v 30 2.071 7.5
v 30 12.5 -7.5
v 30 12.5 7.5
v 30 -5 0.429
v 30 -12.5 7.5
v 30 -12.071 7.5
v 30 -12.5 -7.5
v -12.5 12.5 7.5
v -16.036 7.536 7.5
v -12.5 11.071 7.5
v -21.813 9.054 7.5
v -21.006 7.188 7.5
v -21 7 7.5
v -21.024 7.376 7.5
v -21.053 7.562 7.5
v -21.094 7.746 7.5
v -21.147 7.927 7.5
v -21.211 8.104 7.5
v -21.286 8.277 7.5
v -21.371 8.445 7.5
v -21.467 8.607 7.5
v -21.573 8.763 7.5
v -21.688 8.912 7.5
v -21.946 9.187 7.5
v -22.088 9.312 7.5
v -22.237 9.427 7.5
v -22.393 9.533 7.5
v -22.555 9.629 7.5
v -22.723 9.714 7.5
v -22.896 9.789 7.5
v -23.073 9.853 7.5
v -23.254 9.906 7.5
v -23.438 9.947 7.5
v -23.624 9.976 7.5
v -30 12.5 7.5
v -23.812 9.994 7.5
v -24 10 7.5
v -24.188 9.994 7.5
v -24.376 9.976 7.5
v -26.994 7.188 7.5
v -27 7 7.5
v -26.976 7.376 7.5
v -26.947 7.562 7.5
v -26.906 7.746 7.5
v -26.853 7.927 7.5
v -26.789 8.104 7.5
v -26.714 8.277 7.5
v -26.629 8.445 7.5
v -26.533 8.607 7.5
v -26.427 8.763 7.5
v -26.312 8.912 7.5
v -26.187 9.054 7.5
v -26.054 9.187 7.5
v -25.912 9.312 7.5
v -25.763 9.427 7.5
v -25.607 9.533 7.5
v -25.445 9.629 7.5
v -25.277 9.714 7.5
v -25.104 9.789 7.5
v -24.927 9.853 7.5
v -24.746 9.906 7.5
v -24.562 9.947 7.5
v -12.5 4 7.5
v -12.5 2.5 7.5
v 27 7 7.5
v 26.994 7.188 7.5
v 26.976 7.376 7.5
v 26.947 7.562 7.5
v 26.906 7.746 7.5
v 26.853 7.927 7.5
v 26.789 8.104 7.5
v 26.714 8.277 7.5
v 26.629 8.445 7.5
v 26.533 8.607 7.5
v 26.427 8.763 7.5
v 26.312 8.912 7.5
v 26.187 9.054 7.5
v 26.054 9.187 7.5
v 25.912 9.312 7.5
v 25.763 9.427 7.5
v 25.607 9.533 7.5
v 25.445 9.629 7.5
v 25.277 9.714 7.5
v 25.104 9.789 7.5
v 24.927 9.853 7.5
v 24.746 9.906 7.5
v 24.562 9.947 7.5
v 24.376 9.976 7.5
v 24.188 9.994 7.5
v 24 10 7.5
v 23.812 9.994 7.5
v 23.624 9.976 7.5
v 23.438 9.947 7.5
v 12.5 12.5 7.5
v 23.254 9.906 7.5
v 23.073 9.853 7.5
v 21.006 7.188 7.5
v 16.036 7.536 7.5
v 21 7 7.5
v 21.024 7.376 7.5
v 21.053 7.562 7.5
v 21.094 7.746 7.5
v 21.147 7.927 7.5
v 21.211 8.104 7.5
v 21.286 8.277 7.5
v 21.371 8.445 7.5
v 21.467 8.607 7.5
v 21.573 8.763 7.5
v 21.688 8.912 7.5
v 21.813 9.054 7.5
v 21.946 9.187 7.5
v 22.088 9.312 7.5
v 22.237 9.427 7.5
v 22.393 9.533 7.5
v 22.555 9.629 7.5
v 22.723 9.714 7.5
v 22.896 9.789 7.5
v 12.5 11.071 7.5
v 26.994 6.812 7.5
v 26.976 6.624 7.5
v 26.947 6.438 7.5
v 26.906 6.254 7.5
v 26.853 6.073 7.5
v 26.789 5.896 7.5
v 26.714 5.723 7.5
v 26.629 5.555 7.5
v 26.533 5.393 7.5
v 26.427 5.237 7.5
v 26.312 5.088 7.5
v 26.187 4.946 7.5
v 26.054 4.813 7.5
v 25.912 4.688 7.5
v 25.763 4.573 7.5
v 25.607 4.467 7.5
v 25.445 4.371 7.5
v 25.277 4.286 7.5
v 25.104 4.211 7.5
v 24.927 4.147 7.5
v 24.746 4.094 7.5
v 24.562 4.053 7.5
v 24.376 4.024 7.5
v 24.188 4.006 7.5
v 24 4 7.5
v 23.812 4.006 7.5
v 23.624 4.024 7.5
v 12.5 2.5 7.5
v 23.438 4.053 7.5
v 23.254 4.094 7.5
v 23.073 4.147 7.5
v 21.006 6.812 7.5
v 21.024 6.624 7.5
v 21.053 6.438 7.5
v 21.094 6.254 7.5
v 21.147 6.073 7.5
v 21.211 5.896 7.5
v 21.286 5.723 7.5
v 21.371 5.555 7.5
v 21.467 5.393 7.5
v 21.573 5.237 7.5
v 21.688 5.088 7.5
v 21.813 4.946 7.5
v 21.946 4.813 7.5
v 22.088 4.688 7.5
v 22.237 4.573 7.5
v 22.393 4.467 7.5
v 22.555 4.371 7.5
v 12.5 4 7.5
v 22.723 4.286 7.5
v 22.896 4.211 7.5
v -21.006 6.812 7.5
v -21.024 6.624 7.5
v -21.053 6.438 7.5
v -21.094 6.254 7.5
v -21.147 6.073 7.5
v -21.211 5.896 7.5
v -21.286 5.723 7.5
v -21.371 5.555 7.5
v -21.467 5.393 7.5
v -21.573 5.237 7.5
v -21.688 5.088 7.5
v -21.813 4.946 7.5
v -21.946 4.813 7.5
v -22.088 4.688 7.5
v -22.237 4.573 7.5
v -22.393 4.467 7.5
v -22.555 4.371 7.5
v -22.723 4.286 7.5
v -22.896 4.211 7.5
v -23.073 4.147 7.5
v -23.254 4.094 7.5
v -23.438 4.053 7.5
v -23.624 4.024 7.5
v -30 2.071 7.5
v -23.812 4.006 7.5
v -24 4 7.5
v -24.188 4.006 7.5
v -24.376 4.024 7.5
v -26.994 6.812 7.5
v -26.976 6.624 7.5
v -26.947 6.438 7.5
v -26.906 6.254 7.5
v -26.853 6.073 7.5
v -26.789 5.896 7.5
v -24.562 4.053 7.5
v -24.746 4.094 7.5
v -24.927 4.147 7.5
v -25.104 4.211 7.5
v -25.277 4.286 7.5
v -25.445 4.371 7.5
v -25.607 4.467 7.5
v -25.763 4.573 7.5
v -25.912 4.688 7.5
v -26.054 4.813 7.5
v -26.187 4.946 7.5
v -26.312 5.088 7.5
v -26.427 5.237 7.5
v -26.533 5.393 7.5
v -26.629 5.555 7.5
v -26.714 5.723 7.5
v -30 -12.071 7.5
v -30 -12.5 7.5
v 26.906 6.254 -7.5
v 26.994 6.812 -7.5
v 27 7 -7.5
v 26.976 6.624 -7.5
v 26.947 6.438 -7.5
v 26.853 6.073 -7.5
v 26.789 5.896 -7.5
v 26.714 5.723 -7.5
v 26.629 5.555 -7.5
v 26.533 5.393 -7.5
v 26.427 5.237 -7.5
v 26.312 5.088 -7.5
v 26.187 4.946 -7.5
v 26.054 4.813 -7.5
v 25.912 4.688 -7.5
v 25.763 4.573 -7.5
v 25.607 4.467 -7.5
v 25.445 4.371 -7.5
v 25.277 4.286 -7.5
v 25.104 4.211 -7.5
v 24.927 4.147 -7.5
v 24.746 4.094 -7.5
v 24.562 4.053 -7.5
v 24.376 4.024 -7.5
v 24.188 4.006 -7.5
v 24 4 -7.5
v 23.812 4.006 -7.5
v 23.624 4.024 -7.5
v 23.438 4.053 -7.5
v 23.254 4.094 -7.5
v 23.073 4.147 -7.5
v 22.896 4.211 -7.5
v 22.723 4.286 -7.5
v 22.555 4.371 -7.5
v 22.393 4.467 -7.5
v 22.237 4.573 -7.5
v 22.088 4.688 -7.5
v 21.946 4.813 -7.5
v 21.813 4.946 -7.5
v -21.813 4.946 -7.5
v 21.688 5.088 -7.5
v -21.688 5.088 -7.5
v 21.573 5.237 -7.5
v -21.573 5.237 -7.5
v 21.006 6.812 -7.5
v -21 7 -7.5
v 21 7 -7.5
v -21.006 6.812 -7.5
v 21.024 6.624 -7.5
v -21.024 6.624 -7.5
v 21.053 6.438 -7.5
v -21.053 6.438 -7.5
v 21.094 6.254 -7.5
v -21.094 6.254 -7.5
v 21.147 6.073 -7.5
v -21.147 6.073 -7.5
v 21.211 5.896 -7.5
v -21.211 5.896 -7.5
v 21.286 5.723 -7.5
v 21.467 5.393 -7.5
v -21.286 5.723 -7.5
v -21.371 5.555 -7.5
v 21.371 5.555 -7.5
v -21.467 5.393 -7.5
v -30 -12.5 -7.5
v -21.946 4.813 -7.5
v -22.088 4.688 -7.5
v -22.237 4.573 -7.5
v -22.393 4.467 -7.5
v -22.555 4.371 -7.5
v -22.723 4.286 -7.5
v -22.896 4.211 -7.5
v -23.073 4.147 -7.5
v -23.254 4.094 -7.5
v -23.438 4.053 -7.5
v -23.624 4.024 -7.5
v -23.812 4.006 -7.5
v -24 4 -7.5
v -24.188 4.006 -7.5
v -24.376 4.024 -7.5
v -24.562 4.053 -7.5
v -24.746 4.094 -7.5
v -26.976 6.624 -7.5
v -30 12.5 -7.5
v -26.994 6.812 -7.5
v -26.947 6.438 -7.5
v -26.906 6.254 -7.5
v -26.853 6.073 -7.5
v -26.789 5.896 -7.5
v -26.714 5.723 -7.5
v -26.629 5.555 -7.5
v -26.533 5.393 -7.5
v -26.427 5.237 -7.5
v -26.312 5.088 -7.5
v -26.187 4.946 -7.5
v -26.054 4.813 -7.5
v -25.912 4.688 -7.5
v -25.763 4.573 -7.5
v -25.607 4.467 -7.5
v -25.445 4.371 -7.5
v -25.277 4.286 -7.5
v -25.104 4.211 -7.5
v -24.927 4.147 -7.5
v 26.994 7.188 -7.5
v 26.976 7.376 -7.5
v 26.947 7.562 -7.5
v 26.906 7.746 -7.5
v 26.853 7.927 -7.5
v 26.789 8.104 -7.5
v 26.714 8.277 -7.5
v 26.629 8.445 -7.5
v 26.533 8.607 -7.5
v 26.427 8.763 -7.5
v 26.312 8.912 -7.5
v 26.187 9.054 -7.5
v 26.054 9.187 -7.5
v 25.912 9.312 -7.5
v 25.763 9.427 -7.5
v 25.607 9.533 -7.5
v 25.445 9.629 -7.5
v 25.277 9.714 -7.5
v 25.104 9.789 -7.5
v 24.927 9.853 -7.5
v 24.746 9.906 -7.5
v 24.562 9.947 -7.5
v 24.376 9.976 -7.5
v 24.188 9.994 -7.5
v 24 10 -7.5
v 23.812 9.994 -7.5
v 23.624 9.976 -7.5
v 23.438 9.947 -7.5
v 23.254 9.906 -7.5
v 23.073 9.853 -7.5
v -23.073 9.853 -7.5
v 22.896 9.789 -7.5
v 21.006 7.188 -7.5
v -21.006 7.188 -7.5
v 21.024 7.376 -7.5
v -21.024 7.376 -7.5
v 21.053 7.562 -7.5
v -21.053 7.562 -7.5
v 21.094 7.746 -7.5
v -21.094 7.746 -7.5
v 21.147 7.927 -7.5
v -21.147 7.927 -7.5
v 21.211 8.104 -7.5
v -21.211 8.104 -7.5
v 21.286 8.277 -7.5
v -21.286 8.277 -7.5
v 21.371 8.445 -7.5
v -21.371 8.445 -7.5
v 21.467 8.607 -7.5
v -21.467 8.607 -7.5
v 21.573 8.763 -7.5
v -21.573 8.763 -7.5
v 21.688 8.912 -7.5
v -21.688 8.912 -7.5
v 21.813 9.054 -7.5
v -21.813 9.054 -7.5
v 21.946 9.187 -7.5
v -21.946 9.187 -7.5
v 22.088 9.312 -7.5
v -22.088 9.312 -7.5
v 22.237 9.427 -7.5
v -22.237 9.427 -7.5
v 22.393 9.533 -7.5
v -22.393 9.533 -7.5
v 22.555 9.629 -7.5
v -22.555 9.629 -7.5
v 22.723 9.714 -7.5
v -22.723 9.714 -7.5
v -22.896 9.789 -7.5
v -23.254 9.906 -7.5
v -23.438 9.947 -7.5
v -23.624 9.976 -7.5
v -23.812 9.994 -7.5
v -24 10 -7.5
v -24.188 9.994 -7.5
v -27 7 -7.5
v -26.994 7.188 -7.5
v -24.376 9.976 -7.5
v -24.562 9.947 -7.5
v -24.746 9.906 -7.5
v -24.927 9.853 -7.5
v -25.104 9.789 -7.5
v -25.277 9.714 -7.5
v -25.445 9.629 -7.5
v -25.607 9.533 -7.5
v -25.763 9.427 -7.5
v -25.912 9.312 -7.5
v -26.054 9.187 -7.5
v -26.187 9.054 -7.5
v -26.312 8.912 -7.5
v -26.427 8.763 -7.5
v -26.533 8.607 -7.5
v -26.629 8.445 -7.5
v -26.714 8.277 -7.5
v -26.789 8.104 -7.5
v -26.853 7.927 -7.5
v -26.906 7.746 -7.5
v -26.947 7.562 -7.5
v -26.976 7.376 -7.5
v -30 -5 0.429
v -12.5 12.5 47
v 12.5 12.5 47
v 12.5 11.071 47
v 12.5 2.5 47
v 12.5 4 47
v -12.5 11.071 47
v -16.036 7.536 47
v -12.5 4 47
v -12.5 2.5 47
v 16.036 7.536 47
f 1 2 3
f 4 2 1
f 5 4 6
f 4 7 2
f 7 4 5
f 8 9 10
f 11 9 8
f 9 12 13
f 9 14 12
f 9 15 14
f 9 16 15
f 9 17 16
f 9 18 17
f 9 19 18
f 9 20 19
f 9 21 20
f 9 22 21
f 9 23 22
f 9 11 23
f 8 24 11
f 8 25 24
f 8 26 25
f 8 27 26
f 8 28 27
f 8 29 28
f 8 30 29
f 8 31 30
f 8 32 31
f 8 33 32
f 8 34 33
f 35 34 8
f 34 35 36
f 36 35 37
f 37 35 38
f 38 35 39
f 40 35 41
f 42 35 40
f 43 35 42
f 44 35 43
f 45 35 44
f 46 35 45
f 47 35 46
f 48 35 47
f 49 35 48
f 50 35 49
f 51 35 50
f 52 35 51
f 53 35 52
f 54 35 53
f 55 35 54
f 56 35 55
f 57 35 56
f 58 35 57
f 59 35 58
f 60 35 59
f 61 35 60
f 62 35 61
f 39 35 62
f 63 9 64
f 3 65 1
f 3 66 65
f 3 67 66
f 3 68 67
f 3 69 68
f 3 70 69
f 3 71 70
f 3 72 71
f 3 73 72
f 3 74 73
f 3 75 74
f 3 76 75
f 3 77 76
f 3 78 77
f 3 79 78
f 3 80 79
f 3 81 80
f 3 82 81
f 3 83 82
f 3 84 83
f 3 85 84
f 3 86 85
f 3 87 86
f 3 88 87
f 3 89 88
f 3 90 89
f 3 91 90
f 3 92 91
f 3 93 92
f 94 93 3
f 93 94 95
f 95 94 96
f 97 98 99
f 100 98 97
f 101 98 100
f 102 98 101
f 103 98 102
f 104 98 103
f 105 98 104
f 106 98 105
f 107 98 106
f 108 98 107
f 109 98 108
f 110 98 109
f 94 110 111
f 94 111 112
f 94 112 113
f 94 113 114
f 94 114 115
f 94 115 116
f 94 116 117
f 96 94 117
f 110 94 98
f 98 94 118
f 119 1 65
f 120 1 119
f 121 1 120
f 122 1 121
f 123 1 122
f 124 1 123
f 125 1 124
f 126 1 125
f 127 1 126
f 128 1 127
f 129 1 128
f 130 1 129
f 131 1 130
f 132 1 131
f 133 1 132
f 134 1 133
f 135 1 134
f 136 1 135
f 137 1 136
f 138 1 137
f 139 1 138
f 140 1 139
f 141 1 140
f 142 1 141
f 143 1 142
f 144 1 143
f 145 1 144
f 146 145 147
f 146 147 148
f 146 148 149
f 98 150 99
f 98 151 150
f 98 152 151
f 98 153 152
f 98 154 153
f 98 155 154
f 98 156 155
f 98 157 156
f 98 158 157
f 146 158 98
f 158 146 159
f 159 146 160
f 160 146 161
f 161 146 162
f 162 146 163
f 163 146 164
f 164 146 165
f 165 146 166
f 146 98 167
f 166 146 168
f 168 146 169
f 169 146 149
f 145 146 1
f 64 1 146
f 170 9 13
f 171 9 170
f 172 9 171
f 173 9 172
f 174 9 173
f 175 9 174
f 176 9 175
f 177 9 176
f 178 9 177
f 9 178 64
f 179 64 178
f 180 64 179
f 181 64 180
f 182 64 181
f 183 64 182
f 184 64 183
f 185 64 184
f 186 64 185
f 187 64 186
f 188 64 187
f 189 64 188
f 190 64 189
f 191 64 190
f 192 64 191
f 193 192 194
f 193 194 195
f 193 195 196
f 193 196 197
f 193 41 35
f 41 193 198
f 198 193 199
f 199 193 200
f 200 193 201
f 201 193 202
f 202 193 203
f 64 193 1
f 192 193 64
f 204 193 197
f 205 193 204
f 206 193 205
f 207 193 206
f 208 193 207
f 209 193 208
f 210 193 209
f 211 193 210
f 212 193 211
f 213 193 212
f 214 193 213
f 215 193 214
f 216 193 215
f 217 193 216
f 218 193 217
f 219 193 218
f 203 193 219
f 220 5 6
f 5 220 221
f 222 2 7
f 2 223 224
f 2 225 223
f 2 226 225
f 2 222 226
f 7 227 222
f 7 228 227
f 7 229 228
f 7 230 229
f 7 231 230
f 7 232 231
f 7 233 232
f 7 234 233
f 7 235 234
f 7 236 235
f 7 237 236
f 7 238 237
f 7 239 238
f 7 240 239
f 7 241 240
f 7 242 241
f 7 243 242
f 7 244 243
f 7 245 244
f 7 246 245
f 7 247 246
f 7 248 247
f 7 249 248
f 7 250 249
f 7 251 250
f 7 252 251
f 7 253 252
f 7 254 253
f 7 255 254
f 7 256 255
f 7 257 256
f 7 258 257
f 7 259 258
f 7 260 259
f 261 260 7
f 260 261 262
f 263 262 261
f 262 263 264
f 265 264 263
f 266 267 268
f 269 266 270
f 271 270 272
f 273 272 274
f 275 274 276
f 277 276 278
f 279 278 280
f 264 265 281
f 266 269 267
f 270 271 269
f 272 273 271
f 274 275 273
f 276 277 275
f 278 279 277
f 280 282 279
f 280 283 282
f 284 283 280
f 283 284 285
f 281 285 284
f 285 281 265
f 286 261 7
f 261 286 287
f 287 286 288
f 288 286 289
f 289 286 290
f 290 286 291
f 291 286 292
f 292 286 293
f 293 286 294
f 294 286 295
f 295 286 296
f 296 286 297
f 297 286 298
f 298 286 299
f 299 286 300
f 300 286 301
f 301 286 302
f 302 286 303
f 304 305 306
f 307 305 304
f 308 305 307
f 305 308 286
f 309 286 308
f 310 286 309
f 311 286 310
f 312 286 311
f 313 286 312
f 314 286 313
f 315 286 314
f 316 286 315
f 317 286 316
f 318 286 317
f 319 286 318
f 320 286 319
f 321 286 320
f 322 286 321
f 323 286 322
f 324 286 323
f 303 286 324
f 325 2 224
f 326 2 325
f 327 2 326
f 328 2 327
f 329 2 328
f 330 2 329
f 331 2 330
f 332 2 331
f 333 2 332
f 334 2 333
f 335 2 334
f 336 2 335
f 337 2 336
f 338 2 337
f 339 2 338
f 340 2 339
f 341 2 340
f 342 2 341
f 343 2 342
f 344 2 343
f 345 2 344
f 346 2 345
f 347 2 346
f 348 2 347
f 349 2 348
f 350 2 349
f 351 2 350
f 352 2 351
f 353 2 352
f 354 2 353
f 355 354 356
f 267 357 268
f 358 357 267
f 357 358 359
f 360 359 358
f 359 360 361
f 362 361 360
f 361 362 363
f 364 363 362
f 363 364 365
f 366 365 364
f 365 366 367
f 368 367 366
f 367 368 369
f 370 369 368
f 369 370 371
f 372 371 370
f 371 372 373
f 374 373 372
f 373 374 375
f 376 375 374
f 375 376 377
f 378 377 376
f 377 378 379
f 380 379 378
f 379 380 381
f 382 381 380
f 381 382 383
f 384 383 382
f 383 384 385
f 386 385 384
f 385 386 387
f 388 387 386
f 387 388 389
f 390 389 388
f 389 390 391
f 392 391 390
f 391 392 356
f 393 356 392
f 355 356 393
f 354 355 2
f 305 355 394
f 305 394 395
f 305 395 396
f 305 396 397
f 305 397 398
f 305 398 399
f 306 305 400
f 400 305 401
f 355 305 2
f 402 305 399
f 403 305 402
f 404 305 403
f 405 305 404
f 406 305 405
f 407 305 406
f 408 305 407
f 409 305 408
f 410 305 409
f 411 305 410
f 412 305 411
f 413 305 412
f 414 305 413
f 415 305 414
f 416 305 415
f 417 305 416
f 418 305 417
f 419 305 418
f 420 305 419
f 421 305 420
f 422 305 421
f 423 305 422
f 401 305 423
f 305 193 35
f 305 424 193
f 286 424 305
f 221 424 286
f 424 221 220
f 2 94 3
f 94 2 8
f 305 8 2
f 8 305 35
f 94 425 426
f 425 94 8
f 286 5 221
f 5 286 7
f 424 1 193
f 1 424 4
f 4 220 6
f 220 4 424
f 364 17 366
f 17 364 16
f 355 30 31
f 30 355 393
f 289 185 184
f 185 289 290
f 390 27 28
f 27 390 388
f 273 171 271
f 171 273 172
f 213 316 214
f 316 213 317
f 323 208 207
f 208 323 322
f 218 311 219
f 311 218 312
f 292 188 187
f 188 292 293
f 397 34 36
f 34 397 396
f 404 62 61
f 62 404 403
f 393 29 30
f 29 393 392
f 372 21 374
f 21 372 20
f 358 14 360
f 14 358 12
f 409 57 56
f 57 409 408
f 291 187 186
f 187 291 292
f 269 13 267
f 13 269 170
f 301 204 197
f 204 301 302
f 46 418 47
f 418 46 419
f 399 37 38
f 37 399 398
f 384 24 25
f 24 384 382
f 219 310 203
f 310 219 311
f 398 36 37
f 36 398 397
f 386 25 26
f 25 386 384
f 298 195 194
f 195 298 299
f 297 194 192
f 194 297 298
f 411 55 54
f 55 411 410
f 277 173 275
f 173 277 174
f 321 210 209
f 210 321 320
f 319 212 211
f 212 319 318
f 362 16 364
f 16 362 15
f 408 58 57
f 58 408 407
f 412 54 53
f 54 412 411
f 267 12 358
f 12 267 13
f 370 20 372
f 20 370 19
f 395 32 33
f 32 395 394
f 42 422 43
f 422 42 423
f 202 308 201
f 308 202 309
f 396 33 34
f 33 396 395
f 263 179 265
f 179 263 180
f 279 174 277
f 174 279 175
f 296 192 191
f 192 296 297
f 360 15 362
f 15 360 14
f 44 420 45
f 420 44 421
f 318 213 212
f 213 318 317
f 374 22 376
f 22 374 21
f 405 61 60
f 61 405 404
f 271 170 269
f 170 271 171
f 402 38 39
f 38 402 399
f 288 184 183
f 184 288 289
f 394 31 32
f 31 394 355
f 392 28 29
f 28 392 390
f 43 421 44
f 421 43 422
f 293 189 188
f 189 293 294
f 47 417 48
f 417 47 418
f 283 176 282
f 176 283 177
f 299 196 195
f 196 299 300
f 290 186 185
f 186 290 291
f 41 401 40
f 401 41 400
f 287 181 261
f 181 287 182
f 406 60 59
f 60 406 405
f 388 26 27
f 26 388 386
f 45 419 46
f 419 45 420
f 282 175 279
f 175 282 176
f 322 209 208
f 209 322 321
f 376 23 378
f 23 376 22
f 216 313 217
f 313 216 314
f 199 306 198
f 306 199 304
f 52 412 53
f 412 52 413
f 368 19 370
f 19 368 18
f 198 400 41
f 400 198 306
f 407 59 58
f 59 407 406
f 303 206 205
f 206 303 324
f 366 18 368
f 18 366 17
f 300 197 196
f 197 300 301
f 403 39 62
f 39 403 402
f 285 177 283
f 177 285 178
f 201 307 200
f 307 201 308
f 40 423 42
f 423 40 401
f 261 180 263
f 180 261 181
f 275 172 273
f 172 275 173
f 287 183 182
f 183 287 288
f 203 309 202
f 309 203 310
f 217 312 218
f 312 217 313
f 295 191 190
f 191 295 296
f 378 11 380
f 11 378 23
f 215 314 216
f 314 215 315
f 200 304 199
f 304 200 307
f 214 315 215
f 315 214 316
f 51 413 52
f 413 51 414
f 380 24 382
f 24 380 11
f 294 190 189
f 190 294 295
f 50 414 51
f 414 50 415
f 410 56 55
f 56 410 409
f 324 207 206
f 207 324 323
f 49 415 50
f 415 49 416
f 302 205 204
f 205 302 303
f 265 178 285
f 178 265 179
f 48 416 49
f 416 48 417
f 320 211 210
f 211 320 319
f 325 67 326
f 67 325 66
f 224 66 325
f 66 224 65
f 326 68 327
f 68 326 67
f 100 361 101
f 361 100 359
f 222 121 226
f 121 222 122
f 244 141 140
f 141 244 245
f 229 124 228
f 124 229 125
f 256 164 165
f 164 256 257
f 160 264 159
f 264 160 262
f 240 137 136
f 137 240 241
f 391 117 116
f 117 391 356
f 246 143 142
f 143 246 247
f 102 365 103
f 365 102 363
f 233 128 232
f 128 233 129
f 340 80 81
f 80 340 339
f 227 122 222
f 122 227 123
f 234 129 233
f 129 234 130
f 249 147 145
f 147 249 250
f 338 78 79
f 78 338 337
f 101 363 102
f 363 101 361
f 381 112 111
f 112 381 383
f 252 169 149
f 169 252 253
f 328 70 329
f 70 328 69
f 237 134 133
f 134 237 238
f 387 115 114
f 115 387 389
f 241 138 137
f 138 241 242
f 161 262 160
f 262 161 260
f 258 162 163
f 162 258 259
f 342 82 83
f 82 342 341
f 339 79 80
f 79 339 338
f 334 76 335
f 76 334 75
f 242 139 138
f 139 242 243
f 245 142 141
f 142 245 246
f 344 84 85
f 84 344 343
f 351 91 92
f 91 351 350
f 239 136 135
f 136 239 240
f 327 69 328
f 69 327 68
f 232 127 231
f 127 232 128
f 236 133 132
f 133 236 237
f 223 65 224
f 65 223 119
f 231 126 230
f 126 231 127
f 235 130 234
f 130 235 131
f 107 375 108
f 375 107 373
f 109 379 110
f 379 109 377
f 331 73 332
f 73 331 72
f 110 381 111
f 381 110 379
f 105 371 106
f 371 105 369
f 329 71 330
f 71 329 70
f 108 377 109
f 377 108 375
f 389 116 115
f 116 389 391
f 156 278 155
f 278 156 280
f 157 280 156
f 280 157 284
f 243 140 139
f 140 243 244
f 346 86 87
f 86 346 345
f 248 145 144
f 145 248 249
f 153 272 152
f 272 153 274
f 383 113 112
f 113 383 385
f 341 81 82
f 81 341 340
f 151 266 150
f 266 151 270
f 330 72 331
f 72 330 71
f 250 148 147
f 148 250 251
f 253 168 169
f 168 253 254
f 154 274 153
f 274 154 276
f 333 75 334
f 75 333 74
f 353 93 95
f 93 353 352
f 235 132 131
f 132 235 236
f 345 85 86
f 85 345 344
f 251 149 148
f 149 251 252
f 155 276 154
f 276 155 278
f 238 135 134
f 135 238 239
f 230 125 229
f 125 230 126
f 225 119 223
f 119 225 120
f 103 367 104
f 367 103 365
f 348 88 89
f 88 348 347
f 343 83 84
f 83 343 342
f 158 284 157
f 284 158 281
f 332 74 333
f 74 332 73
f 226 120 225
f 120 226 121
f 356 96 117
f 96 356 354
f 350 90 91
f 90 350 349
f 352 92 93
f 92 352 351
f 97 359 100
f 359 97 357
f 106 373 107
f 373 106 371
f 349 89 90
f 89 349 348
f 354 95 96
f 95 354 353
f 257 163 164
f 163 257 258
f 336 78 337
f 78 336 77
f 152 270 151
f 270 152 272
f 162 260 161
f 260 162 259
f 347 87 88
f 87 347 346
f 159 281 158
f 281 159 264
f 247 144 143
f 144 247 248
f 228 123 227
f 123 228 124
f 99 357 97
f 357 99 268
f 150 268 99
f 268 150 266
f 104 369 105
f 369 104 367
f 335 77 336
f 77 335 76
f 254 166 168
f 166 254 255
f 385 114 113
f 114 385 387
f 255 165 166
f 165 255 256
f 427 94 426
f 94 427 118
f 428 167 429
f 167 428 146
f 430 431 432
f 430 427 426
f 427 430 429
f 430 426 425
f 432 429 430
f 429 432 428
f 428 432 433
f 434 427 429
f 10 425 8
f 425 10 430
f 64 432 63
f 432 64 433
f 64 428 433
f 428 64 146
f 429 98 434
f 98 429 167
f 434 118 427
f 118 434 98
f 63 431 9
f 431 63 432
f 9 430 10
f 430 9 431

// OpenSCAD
module base () {
	difference () {
		cube([60,25,15], center=true);
		translate([0,-5,7.5]) {
			rotate([45,0,0]) {
				cube([60,10,10], center=true);
			}
		}
		translate([-24, 7, -7.5]) {
			cylinder(h=15, d=6, $fn=100);
		}
		translate([24, 7, -7.5]) {
			cylinder(h=15, d=6, $fn=100);
		}
	}
	translate([0,7.5,27]) {
		cube([25,10,40], center=true);
	}
	translate([12.5,4,7]) {
		rotate([0,0,45]) {
			cube([5,5,40]);
		}
	}
	translate([-12.5,4,7]) {
		rotate([0,0,45]) {
			cube([5,5,40]);
		}
	}
}

base();
